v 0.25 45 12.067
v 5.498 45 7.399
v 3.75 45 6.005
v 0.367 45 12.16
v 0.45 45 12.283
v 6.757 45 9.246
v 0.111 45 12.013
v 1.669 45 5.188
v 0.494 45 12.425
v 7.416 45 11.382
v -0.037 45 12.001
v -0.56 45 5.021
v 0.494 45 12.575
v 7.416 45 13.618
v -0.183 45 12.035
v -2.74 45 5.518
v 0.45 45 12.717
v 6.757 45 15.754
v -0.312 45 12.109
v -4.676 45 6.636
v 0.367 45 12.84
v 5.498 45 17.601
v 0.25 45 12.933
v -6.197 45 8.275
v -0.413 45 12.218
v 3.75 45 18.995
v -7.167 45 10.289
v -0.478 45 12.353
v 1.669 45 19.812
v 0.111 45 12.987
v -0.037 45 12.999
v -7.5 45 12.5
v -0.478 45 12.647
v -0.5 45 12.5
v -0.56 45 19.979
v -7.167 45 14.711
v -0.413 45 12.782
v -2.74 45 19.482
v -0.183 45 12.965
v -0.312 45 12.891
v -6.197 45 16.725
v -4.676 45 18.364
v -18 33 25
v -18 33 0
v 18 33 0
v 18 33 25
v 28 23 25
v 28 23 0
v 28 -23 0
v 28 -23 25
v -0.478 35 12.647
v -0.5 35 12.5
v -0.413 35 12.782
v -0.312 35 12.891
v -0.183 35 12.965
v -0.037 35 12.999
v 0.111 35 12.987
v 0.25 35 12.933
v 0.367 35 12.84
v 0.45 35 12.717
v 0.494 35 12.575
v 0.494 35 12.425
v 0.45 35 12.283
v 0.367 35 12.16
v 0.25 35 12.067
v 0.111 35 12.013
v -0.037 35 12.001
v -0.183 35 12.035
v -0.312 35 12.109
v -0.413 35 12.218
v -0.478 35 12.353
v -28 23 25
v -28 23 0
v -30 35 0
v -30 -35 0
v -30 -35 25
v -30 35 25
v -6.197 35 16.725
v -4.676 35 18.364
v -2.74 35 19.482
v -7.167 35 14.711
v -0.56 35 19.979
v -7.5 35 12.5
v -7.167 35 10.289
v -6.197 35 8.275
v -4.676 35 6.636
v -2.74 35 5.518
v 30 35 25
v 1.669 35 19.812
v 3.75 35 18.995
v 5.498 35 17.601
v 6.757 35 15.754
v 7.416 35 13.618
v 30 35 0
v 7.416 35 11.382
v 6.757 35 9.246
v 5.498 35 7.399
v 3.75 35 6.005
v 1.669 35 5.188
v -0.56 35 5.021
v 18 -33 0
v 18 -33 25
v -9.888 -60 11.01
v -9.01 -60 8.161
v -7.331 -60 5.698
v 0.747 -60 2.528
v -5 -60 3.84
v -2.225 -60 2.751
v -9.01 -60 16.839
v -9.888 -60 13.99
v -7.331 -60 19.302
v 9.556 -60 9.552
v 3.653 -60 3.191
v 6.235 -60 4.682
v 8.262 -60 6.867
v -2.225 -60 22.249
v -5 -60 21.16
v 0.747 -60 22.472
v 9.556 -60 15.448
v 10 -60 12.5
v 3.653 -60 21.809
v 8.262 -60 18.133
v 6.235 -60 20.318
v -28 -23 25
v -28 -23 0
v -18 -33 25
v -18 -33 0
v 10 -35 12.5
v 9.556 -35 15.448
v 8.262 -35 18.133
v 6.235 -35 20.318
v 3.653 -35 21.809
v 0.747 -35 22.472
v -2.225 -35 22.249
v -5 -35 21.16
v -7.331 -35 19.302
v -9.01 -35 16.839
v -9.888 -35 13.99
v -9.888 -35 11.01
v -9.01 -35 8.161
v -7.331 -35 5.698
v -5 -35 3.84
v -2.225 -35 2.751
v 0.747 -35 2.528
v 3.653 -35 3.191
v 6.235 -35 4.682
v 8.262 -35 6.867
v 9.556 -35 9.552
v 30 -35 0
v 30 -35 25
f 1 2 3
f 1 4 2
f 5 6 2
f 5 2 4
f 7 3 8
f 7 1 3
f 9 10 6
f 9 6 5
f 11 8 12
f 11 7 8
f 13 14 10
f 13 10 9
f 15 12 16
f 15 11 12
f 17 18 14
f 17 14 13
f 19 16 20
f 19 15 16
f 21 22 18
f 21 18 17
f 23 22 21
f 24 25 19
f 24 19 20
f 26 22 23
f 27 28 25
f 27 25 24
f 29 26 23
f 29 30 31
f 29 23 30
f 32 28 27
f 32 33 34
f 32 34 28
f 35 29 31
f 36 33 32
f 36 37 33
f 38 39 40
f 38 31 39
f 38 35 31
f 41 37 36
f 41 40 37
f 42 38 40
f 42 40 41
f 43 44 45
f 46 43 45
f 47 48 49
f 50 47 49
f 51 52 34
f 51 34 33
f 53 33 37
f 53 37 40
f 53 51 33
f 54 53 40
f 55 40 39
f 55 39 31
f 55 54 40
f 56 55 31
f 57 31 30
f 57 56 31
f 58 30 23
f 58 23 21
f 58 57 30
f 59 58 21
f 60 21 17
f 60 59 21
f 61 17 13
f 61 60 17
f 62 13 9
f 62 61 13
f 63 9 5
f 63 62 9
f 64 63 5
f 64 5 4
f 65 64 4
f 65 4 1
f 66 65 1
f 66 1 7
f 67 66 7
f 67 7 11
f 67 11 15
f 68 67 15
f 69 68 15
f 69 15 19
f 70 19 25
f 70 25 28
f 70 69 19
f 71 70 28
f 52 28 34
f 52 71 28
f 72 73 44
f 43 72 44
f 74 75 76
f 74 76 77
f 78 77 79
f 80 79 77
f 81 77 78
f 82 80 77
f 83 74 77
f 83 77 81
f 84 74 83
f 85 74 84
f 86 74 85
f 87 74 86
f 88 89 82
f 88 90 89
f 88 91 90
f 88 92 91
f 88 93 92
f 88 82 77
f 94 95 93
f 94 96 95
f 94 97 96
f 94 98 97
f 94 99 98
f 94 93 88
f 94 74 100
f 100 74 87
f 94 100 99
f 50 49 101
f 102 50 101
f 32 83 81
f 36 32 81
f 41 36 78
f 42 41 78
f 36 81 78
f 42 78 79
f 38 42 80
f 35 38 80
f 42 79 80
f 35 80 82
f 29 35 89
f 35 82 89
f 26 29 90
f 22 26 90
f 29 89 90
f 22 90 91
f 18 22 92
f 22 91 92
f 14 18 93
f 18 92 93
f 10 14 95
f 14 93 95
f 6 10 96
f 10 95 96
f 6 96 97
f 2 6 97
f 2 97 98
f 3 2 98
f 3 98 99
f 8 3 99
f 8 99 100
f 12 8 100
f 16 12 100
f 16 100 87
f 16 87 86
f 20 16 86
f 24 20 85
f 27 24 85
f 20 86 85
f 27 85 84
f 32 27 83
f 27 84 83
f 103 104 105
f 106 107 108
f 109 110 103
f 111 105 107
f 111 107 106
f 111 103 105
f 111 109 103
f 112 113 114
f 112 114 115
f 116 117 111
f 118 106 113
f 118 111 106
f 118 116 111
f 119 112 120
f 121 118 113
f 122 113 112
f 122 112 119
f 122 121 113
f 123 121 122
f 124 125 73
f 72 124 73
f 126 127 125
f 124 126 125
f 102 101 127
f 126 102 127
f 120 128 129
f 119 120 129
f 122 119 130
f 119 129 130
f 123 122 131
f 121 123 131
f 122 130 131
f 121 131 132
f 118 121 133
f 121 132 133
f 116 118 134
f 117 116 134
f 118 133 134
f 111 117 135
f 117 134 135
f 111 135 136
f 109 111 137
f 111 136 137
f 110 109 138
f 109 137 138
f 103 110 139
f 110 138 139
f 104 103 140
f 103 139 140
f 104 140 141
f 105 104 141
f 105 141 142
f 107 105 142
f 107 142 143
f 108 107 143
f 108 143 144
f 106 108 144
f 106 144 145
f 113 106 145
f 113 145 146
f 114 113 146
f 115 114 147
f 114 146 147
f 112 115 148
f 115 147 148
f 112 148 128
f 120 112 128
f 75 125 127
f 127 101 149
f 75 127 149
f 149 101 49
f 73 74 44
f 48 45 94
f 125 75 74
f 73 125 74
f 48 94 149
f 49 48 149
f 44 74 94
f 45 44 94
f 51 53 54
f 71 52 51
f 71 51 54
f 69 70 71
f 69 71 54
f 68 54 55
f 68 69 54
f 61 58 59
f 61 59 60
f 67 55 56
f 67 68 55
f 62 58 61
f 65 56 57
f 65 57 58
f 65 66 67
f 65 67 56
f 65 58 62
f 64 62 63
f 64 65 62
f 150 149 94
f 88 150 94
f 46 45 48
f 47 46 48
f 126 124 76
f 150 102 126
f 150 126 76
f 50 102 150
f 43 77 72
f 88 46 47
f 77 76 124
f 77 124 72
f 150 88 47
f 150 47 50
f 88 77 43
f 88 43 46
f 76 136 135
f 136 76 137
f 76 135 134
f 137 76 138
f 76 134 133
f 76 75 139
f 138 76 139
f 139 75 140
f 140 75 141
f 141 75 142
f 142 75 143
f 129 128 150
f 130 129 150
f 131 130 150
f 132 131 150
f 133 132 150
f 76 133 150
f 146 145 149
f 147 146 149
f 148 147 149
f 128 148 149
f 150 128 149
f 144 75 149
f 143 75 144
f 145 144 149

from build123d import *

# Parameters (mm, degrees)
F0_W     = 60
F0_H     = 70
F1_DEPTH = 25
F2_R     = 10
F3_DEPTH = 25
F4_R     = 7.5
F4_R_2   = 0.5
F5_DEPTH = 10


with BuildPart() as f1:
    # F0 (on Top) → F1 (new body)
    with BuildSketch(Plane.XY):
        Rectangle(F0_W, F0_H)
        Polygon((18, 33), (28, 23), (28, -23), (18, -33), (-18, -33), (-28, -23), (-28, 23), (-18, 33), align=None, mode=Mode.SUBTRACT)
    extrude(amount=F1_DEPTH)

    # F2 (on face) → F3 (join)
    with BuildSketch(Plane.XZ.offset(35)):
        with Locations((0, 12.5)):
            Circle(F2_R)
    extrude(amount=F3_DEPTH)

    # F4 (on face) → F5 (join)
    with BuildSketch(Plane(origin=(0, 35, 0), x_dir=(-1, 0, 0), z_dir=(0, 1, 0))):
        with Locations((0, 12.5)):
            Circle(F4_R)
        with Locations((0, 12.5)):
            Circle(F4_R_2, mode=Mode.SUBTRACT)
    extrude(amount=F5_DEPTH)


solid = f1.part
